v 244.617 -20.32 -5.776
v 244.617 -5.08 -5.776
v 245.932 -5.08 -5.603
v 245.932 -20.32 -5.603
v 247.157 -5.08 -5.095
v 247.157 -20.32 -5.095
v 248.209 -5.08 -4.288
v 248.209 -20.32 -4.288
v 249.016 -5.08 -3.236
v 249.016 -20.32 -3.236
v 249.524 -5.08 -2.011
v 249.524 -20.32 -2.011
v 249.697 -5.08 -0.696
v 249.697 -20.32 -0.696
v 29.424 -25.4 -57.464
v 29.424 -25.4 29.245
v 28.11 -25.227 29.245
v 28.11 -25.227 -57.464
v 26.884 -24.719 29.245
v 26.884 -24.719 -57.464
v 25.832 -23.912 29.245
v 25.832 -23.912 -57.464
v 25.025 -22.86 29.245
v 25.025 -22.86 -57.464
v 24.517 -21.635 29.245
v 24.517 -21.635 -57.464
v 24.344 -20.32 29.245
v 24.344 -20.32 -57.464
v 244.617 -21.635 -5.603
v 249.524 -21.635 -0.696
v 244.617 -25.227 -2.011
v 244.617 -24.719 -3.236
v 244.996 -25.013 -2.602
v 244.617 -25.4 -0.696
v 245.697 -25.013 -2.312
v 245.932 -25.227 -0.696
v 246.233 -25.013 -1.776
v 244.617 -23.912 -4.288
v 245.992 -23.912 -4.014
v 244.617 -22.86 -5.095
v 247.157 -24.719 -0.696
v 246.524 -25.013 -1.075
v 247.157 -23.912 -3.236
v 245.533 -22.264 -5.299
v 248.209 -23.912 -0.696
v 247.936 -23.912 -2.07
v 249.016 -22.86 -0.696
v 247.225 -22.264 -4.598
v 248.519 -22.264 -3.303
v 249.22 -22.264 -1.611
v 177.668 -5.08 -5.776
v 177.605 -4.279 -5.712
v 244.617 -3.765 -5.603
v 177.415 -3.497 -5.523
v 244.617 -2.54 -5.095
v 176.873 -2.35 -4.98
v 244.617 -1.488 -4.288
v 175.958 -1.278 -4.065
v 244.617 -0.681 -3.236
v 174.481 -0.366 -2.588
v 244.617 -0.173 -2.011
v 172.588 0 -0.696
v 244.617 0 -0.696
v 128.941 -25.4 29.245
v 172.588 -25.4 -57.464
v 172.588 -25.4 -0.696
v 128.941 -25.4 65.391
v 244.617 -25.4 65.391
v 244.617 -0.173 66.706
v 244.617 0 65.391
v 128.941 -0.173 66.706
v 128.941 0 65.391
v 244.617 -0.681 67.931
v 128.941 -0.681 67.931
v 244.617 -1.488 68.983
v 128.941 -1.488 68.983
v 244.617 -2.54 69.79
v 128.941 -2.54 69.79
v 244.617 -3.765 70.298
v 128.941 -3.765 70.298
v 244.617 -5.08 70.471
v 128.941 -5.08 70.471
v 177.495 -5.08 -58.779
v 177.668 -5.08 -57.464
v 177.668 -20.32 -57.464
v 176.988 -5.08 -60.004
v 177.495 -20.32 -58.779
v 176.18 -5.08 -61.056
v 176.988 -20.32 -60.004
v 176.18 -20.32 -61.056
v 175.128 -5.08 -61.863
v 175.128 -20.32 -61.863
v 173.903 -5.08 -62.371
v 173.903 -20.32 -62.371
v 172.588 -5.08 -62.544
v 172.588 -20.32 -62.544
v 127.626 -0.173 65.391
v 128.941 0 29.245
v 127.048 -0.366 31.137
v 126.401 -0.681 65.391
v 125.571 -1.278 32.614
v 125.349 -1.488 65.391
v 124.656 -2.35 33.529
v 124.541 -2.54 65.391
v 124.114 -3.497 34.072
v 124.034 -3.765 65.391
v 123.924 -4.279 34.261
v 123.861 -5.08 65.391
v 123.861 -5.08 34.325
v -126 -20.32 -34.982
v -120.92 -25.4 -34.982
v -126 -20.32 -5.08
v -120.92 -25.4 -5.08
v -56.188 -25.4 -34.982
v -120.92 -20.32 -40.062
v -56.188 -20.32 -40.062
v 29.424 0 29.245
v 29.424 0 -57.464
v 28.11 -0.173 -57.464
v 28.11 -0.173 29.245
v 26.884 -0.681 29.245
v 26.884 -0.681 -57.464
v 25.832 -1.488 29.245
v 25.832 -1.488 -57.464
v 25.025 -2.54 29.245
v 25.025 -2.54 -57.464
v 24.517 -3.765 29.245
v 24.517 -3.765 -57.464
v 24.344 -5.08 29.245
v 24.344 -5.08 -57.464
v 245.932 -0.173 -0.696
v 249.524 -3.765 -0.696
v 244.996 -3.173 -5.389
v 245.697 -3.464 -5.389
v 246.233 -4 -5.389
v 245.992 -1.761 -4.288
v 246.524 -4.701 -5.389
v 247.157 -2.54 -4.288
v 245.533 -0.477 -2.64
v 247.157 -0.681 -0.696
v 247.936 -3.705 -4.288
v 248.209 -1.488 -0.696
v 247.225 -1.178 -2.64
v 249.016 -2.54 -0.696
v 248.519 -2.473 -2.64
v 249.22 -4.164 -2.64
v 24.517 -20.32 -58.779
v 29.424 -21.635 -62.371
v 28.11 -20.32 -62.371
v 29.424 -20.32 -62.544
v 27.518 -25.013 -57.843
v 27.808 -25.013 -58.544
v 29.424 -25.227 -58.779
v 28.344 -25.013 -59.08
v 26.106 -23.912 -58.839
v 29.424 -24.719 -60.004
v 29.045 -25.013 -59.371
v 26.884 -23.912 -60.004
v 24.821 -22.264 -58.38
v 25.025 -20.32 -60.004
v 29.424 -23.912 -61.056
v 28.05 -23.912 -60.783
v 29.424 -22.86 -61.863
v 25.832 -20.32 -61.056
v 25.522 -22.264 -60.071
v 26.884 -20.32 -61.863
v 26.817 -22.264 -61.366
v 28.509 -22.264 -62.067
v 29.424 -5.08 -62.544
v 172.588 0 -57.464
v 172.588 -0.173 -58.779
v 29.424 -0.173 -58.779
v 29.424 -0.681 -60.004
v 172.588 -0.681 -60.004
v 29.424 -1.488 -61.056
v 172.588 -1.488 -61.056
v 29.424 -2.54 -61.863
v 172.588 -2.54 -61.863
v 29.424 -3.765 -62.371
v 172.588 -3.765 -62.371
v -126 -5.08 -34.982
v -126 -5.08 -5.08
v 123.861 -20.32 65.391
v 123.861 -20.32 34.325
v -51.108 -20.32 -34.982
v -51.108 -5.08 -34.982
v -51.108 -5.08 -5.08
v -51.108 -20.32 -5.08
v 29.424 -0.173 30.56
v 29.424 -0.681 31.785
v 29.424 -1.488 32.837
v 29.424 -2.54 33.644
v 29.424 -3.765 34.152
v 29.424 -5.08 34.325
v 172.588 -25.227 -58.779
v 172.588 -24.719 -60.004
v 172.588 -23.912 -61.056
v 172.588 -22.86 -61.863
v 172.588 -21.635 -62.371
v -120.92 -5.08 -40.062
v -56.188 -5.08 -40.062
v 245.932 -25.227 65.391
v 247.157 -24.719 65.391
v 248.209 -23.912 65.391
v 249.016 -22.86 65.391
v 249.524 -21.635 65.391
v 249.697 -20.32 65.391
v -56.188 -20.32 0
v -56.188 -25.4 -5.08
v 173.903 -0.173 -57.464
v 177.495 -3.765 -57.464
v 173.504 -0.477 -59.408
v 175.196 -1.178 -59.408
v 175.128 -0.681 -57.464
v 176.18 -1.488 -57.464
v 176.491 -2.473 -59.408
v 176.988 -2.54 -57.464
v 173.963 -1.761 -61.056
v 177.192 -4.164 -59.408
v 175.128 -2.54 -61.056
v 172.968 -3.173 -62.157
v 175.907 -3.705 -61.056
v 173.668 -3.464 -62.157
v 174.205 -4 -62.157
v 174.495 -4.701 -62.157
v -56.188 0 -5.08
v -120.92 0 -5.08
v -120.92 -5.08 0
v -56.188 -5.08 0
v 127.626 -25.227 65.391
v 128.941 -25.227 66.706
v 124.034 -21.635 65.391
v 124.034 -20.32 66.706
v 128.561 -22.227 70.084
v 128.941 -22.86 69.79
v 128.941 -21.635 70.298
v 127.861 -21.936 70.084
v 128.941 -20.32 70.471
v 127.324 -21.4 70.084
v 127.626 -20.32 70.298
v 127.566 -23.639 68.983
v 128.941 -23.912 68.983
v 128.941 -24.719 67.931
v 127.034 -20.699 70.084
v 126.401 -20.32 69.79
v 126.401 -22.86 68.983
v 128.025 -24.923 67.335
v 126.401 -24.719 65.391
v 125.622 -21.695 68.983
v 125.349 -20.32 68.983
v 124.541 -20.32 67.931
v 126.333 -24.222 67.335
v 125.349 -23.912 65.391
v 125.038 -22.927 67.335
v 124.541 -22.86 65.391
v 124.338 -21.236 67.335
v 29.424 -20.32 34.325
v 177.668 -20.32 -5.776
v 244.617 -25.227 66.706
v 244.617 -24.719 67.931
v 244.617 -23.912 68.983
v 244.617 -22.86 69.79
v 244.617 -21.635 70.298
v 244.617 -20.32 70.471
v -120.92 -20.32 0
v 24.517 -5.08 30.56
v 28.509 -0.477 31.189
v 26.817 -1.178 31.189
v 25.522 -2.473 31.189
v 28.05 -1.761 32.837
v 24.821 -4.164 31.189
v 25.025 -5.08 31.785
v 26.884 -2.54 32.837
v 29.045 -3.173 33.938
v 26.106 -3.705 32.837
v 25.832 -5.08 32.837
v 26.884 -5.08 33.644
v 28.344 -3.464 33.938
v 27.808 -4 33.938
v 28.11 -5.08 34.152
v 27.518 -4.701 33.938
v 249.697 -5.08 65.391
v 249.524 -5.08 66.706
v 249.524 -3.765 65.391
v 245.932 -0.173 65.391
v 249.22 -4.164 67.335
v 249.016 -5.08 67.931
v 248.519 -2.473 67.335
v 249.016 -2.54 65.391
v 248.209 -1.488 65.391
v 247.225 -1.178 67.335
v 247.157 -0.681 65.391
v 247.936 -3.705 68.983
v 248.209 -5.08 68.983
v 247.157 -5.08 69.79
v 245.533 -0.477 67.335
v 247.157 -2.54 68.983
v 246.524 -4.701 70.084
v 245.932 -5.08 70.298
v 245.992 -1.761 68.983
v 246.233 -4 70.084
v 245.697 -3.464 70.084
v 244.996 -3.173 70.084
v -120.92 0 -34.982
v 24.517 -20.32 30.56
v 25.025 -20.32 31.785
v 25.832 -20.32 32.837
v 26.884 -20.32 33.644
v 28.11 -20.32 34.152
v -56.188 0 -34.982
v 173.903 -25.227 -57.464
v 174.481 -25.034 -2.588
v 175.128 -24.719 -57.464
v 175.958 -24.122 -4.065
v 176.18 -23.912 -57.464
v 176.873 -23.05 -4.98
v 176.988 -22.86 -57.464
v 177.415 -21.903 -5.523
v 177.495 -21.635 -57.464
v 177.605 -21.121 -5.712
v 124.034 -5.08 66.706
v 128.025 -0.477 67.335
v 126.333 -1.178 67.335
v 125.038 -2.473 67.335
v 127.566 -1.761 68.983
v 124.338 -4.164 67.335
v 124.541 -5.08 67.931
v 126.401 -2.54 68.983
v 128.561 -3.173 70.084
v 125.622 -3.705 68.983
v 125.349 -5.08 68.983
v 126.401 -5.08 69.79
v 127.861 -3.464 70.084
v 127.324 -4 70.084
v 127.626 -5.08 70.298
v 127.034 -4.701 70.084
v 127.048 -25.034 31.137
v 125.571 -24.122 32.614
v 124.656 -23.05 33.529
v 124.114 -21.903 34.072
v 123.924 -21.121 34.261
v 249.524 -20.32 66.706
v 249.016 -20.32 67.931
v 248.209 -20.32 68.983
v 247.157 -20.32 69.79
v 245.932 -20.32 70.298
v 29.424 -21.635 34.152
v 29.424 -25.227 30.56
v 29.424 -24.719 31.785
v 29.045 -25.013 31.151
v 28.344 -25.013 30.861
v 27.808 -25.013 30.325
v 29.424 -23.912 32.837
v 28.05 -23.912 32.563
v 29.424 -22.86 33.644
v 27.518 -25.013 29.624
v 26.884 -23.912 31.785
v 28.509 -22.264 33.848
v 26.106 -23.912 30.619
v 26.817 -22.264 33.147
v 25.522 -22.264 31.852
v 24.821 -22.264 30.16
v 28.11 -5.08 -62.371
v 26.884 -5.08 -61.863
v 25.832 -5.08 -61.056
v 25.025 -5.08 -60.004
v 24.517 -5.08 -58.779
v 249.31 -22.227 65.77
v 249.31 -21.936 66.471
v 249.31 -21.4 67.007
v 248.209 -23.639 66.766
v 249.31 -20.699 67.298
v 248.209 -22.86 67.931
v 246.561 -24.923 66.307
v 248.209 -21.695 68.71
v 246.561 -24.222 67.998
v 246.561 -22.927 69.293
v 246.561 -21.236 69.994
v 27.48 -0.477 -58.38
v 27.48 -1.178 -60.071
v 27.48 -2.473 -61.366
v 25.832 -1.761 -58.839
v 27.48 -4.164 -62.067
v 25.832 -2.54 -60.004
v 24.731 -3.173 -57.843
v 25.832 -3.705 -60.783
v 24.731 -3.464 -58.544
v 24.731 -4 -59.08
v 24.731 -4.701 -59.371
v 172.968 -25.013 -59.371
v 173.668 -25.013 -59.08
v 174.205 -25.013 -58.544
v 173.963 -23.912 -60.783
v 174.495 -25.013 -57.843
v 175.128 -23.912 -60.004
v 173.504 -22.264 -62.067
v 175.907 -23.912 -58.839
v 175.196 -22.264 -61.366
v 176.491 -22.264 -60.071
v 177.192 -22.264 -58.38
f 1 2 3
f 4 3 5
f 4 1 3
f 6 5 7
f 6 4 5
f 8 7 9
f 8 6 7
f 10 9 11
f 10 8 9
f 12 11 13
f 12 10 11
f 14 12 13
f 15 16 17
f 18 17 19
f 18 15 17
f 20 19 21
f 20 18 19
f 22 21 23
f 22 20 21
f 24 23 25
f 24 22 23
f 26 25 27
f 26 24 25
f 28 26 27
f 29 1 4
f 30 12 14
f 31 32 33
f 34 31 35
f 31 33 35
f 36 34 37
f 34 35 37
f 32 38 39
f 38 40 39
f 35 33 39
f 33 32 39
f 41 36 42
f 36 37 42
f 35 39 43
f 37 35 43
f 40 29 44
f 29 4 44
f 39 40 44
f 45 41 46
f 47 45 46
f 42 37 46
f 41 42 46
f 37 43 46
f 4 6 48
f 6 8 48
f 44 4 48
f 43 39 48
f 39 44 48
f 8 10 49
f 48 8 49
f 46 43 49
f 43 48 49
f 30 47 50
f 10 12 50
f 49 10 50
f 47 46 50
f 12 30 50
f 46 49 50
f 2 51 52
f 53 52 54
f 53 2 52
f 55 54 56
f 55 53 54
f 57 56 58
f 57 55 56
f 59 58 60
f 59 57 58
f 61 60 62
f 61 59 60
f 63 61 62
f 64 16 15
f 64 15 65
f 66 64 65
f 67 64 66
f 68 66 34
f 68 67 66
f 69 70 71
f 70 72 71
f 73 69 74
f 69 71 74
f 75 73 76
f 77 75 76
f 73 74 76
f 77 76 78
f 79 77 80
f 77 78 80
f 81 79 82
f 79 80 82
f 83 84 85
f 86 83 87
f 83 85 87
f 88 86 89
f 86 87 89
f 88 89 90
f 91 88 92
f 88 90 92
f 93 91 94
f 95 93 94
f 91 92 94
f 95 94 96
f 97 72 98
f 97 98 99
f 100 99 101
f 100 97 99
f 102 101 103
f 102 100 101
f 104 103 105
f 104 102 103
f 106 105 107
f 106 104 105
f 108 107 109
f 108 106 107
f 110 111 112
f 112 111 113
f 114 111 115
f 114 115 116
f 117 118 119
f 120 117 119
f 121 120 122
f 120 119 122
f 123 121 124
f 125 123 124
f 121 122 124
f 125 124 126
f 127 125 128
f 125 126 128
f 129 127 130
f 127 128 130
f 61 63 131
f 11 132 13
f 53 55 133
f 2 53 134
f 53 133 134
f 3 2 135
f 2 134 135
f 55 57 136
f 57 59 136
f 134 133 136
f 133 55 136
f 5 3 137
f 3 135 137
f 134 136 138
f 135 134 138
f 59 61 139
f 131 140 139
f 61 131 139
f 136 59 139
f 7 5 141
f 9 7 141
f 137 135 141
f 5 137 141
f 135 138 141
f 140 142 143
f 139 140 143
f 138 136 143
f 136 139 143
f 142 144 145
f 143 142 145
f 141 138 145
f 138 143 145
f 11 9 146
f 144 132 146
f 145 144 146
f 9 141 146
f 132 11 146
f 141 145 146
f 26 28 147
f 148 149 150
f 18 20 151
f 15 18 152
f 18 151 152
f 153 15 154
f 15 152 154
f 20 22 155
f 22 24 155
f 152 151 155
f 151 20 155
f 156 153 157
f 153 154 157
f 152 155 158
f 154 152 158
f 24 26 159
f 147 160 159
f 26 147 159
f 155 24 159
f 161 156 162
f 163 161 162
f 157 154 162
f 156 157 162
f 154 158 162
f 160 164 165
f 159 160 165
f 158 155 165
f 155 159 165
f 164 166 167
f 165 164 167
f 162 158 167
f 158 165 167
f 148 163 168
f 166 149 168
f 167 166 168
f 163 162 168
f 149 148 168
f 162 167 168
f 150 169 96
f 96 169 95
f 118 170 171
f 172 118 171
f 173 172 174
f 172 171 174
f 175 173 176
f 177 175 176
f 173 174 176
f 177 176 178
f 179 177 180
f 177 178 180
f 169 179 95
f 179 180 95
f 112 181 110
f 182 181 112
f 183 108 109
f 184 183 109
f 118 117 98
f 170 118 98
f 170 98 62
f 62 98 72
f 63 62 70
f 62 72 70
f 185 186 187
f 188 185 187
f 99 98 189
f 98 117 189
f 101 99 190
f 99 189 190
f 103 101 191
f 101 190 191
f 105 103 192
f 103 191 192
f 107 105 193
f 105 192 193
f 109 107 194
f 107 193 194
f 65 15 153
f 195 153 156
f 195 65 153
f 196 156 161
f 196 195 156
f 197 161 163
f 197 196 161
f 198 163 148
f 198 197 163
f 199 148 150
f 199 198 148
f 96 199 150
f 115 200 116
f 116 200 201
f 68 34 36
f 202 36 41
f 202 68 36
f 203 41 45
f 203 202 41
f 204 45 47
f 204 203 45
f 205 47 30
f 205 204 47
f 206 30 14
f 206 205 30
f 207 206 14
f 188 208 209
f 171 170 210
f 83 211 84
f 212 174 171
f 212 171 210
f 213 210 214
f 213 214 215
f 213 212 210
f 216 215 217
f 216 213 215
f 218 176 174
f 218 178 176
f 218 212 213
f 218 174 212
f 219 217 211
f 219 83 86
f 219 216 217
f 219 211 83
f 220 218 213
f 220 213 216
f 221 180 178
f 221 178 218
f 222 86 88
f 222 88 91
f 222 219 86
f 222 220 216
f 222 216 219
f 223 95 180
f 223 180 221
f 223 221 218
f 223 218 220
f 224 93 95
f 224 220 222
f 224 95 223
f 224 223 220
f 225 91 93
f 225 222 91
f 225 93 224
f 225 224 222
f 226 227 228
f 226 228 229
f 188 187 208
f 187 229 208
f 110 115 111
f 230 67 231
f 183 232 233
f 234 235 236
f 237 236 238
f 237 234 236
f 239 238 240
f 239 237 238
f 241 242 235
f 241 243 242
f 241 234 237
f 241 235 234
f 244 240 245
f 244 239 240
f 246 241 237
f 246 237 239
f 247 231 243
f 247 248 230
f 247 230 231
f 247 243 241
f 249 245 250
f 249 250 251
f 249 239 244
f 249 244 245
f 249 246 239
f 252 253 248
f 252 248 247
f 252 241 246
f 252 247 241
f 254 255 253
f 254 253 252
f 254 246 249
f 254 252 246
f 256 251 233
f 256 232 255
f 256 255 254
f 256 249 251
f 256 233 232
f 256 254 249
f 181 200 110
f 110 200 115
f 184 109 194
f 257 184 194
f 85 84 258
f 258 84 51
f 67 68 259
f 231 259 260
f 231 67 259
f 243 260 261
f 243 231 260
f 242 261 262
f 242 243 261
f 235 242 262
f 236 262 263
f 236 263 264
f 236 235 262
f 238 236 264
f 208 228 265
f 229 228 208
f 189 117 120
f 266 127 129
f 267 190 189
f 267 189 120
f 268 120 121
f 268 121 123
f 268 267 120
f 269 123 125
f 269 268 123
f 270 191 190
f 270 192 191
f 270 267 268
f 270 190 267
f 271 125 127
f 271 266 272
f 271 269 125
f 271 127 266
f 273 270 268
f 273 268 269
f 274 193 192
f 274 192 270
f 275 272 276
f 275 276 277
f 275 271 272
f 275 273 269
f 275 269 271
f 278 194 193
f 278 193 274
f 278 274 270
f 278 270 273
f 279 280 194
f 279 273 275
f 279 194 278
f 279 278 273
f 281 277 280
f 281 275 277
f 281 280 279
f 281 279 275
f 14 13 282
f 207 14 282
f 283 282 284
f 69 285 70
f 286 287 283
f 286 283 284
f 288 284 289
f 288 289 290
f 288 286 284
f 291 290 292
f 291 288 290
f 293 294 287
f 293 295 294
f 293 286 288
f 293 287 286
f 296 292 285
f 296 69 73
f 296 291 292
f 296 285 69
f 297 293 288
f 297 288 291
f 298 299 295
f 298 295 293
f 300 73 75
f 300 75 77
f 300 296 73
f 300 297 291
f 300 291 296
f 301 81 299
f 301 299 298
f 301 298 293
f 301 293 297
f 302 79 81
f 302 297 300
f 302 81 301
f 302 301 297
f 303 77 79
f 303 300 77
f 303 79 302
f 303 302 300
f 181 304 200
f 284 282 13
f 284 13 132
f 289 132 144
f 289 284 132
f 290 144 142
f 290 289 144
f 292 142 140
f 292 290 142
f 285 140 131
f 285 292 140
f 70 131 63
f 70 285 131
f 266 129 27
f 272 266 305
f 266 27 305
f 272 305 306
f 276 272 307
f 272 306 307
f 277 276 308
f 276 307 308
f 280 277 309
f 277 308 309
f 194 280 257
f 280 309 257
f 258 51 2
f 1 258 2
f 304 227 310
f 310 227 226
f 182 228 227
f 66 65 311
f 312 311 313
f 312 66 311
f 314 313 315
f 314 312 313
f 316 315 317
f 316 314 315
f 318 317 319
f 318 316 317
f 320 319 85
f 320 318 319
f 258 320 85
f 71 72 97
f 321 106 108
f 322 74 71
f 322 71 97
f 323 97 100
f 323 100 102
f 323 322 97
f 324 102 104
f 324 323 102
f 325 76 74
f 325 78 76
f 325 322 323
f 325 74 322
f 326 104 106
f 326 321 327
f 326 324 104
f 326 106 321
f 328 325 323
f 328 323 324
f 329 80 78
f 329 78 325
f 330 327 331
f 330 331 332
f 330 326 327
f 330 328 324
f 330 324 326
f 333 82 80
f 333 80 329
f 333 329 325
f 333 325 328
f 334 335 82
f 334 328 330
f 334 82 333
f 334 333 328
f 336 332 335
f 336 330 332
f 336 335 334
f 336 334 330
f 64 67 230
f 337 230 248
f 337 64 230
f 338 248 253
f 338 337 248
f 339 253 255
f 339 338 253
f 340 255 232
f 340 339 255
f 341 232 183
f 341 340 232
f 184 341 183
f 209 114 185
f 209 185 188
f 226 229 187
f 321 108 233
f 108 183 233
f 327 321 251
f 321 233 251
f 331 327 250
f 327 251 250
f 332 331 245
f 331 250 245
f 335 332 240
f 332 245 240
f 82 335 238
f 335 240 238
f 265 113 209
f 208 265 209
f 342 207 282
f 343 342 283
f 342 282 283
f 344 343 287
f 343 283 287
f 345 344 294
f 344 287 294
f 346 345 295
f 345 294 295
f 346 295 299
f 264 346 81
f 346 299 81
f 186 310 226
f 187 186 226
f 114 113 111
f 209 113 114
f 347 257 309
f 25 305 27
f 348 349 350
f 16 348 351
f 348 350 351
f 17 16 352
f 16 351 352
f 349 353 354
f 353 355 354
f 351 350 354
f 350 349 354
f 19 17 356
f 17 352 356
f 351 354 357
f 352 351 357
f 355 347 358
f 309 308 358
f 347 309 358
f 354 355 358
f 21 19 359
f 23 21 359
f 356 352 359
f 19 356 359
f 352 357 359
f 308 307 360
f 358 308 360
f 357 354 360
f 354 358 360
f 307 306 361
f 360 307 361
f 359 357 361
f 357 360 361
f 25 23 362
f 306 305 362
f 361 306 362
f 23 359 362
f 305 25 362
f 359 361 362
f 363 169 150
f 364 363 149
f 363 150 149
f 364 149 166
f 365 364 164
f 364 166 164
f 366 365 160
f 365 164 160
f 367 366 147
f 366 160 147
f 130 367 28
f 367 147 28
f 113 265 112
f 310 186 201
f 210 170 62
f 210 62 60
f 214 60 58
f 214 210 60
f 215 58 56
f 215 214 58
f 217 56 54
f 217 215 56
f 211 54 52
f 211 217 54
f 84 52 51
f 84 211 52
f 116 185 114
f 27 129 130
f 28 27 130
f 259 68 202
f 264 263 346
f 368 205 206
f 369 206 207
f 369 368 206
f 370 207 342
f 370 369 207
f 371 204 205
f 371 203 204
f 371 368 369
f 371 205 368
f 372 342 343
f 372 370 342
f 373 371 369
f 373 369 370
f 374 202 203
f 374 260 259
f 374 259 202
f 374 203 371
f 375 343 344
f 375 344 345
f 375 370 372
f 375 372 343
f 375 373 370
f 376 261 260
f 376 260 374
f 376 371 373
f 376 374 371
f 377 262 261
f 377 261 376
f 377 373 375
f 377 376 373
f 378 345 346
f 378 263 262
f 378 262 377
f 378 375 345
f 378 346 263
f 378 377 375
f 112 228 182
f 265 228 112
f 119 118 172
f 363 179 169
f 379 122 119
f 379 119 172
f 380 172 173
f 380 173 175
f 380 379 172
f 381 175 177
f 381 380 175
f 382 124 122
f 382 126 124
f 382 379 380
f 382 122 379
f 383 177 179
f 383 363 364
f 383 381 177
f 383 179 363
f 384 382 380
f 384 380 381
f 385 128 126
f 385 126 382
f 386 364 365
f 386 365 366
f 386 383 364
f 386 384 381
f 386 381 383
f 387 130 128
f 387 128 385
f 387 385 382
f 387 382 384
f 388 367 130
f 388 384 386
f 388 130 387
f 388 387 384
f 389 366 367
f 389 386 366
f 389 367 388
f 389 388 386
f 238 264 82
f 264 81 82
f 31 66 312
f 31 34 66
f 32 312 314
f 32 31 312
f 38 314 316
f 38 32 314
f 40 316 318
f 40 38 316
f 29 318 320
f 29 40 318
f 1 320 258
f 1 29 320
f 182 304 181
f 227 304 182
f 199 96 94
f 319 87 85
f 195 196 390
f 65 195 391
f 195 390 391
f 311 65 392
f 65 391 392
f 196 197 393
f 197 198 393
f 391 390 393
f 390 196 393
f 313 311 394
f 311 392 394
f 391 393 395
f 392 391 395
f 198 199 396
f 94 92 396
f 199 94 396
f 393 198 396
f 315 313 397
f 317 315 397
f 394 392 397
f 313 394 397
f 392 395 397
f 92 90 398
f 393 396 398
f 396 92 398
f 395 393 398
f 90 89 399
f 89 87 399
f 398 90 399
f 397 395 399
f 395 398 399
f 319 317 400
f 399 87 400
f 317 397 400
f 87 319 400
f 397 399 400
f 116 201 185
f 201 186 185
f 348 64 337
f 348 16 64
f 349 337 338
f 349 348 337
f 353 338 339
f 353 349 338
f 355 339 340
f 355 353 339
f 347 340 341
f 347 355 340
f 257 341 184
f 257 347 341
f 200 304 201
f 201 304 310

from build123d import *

# Parameters (mm, degrees)
F0_W     = 74.8927108943
F0_H     = 40.061917156
F1_DEPTH = 25.4
F0_W_2   = 83.2777917385
F0_H_2   = 54.8879876733
F0_W_3   = 53.8076832891
F0_H_3   = 40.1005172171
F2_R     = 5.08
F3_R     = 5.08
F4_R     = 5.08
F5_R     = 5.08
F6_R     = 5.08
F7_R     = 5.08
F9_R     = 5.08
F10_R    = 5.08
F12_SIZE = 5.08


# Not quite as in the source:
# - a feature of the source that left no trace in its solid (it failed there, or was rolled back) is left out


with BuildPart() as f1:
    # F0 (on Front) → F1 (new body)
    with BuildSketch(Plane.XZ):
        with Locations((-88.5540191084, -20.030958578)):
            Rectangle(F0_W, F0_H)
    extrude(amount=F1_DEPTH)

    # F12
    f12_edges = [f1.edges().sort_by_distance(p)[0] for p in [
        (-51.107664, -12.7, 0),
        (-126.000375, -12.7, 0),
        (-88.554019, 0, 0),
        (-88.554019, -25.4, 0),
        (-51.107664, -12.7, -40.061917),
        (-51.107664, 0, -20.030959),
        (-51.107664, -25.4, -20.030959),
        (-126.000375, 0, -20.030959),
        (-88.554019, 0, -40.061917),
        (-126.000375, -12.7, -40.061917),
        (-88.554019, -25.4, -40.061917),
        (-126.000375, -25.4, -20.030959),
    ]]
    chamfer(f12_edges, length=F12_SIZE)


with BuildPart() as f1b:
    # F0 (on Front) → F1, piece 2 (new body)
    with BuildSketch(Plane.XZ):
        with Locations((-227.9445976019, -110.2393232286)):
            Rectangle(F0_W_2, F0_H_2)
    extrude(amount=F1_DEPTH)


with BuildPart() as f1c:
    # F0 (on Front) → F1, piece 3 (new body)
    with BuildSketch(Plane.XZ):
        Polygon((249.6970742941, -5.7757184841), (249.6970742941, 70.4710111022), (123.860694468, 70.4710111022), (123.860694468, 34.324798733), (177.6683777571, 34.324798733), (177.6683777571, -5.7757184841), align=None)
        with Locations((150.7645361125, 14.2745401245)):
            Rectangle(F0_W_3, F0_H_3)
        Polygon((123.860694468, -5.7757184841), (123.860694468, 34.324798733), (24.3443846703, 34.324798733), (24.3443846703, -62.544003129), (177.6683777571, -62.544003129), (177.6683777571, -5.7757184841), align=None)
    extrude(amount=F1_DEPTH)

    # F2
    f2_edges = [f1c.edges().sort_by_distance(p)[0] for p in [
        (249.697074, 0, 32.347646),
    ]]
    fillet(f2_edges, radius=F2_R)

    # F3
    f3_edges = [f1c.edges().sort_by_distance(p)[0] for p in [
        (211.142726, 0, -5.775718),
    ]]
    fillet(f3_edges, radius=F3_R)

    # F4
    f4_edges = [f1c.edges().sort_by_distance(p)[0] for p in [
        (177.668378, 0, -34.159861),
    ]]
    fillet(f4_edges, radius=F4_R)

    # F5
    f5_edges = [f1c.edges().sort_by_distance(p)[0] for p in [
        (98.466381, 0, -62.544003),
    ]]
    fillet(f5_edges, radius=F5_R)

    # F6
    f6_edges = [f1c.edges().sort_by_distance(p)[0] for p in [
        (24.344385, 0, -11.569602),
    ]]
    fillet(f6_edges, radius=F6_R)

    # F7
    f7_edges = [f1c.edges().sort_by_distance(p)[0] for p in [
        (76.64254, 0, 34.324799),
    ]]
    fillet(f7_edges, radius=F7_R)

    # F9
    f9_edges = [f1c.edges().sort_by_distance(p)[0] for p in [
        (123.860694, 0, 31.784799),
    ]]
    fillet(f9_edges, radius=F9_R)

    # F10
    f10_edges = [f1c.edges().sort_by_distance(p)[0] for p in [
        (24.344385, -25.4, -14.109602),
        (25.832282, -25.4, 32.836901),
        (25.832282, -25.4, -61.056106),
        (76.64254, -25.4, 34.324799),
        (101.006381, -25.4, -62.544003),
        (123.860694, -25.4, 52.397905),
        (176.18048, -25.4, -61.056106),
        (186.778884, -25.4, 70.471011),
        (177.668378, -25.4, -31.619861),
        (249.697074, -25.4, 34.887646),
        (211.142726, -25.4, -5.775718),
        (248.209177, -25.4, -4.287821),
        (186.778884, 0, 70.471011),
        (125.348592, -1.487898, 70.471011),
        (248.209177, -1.487898, 70.471011),
    ]]
    fillet(f10_edges, radius=F10_R)


solid = Compound([f1.part, f1c.part])
